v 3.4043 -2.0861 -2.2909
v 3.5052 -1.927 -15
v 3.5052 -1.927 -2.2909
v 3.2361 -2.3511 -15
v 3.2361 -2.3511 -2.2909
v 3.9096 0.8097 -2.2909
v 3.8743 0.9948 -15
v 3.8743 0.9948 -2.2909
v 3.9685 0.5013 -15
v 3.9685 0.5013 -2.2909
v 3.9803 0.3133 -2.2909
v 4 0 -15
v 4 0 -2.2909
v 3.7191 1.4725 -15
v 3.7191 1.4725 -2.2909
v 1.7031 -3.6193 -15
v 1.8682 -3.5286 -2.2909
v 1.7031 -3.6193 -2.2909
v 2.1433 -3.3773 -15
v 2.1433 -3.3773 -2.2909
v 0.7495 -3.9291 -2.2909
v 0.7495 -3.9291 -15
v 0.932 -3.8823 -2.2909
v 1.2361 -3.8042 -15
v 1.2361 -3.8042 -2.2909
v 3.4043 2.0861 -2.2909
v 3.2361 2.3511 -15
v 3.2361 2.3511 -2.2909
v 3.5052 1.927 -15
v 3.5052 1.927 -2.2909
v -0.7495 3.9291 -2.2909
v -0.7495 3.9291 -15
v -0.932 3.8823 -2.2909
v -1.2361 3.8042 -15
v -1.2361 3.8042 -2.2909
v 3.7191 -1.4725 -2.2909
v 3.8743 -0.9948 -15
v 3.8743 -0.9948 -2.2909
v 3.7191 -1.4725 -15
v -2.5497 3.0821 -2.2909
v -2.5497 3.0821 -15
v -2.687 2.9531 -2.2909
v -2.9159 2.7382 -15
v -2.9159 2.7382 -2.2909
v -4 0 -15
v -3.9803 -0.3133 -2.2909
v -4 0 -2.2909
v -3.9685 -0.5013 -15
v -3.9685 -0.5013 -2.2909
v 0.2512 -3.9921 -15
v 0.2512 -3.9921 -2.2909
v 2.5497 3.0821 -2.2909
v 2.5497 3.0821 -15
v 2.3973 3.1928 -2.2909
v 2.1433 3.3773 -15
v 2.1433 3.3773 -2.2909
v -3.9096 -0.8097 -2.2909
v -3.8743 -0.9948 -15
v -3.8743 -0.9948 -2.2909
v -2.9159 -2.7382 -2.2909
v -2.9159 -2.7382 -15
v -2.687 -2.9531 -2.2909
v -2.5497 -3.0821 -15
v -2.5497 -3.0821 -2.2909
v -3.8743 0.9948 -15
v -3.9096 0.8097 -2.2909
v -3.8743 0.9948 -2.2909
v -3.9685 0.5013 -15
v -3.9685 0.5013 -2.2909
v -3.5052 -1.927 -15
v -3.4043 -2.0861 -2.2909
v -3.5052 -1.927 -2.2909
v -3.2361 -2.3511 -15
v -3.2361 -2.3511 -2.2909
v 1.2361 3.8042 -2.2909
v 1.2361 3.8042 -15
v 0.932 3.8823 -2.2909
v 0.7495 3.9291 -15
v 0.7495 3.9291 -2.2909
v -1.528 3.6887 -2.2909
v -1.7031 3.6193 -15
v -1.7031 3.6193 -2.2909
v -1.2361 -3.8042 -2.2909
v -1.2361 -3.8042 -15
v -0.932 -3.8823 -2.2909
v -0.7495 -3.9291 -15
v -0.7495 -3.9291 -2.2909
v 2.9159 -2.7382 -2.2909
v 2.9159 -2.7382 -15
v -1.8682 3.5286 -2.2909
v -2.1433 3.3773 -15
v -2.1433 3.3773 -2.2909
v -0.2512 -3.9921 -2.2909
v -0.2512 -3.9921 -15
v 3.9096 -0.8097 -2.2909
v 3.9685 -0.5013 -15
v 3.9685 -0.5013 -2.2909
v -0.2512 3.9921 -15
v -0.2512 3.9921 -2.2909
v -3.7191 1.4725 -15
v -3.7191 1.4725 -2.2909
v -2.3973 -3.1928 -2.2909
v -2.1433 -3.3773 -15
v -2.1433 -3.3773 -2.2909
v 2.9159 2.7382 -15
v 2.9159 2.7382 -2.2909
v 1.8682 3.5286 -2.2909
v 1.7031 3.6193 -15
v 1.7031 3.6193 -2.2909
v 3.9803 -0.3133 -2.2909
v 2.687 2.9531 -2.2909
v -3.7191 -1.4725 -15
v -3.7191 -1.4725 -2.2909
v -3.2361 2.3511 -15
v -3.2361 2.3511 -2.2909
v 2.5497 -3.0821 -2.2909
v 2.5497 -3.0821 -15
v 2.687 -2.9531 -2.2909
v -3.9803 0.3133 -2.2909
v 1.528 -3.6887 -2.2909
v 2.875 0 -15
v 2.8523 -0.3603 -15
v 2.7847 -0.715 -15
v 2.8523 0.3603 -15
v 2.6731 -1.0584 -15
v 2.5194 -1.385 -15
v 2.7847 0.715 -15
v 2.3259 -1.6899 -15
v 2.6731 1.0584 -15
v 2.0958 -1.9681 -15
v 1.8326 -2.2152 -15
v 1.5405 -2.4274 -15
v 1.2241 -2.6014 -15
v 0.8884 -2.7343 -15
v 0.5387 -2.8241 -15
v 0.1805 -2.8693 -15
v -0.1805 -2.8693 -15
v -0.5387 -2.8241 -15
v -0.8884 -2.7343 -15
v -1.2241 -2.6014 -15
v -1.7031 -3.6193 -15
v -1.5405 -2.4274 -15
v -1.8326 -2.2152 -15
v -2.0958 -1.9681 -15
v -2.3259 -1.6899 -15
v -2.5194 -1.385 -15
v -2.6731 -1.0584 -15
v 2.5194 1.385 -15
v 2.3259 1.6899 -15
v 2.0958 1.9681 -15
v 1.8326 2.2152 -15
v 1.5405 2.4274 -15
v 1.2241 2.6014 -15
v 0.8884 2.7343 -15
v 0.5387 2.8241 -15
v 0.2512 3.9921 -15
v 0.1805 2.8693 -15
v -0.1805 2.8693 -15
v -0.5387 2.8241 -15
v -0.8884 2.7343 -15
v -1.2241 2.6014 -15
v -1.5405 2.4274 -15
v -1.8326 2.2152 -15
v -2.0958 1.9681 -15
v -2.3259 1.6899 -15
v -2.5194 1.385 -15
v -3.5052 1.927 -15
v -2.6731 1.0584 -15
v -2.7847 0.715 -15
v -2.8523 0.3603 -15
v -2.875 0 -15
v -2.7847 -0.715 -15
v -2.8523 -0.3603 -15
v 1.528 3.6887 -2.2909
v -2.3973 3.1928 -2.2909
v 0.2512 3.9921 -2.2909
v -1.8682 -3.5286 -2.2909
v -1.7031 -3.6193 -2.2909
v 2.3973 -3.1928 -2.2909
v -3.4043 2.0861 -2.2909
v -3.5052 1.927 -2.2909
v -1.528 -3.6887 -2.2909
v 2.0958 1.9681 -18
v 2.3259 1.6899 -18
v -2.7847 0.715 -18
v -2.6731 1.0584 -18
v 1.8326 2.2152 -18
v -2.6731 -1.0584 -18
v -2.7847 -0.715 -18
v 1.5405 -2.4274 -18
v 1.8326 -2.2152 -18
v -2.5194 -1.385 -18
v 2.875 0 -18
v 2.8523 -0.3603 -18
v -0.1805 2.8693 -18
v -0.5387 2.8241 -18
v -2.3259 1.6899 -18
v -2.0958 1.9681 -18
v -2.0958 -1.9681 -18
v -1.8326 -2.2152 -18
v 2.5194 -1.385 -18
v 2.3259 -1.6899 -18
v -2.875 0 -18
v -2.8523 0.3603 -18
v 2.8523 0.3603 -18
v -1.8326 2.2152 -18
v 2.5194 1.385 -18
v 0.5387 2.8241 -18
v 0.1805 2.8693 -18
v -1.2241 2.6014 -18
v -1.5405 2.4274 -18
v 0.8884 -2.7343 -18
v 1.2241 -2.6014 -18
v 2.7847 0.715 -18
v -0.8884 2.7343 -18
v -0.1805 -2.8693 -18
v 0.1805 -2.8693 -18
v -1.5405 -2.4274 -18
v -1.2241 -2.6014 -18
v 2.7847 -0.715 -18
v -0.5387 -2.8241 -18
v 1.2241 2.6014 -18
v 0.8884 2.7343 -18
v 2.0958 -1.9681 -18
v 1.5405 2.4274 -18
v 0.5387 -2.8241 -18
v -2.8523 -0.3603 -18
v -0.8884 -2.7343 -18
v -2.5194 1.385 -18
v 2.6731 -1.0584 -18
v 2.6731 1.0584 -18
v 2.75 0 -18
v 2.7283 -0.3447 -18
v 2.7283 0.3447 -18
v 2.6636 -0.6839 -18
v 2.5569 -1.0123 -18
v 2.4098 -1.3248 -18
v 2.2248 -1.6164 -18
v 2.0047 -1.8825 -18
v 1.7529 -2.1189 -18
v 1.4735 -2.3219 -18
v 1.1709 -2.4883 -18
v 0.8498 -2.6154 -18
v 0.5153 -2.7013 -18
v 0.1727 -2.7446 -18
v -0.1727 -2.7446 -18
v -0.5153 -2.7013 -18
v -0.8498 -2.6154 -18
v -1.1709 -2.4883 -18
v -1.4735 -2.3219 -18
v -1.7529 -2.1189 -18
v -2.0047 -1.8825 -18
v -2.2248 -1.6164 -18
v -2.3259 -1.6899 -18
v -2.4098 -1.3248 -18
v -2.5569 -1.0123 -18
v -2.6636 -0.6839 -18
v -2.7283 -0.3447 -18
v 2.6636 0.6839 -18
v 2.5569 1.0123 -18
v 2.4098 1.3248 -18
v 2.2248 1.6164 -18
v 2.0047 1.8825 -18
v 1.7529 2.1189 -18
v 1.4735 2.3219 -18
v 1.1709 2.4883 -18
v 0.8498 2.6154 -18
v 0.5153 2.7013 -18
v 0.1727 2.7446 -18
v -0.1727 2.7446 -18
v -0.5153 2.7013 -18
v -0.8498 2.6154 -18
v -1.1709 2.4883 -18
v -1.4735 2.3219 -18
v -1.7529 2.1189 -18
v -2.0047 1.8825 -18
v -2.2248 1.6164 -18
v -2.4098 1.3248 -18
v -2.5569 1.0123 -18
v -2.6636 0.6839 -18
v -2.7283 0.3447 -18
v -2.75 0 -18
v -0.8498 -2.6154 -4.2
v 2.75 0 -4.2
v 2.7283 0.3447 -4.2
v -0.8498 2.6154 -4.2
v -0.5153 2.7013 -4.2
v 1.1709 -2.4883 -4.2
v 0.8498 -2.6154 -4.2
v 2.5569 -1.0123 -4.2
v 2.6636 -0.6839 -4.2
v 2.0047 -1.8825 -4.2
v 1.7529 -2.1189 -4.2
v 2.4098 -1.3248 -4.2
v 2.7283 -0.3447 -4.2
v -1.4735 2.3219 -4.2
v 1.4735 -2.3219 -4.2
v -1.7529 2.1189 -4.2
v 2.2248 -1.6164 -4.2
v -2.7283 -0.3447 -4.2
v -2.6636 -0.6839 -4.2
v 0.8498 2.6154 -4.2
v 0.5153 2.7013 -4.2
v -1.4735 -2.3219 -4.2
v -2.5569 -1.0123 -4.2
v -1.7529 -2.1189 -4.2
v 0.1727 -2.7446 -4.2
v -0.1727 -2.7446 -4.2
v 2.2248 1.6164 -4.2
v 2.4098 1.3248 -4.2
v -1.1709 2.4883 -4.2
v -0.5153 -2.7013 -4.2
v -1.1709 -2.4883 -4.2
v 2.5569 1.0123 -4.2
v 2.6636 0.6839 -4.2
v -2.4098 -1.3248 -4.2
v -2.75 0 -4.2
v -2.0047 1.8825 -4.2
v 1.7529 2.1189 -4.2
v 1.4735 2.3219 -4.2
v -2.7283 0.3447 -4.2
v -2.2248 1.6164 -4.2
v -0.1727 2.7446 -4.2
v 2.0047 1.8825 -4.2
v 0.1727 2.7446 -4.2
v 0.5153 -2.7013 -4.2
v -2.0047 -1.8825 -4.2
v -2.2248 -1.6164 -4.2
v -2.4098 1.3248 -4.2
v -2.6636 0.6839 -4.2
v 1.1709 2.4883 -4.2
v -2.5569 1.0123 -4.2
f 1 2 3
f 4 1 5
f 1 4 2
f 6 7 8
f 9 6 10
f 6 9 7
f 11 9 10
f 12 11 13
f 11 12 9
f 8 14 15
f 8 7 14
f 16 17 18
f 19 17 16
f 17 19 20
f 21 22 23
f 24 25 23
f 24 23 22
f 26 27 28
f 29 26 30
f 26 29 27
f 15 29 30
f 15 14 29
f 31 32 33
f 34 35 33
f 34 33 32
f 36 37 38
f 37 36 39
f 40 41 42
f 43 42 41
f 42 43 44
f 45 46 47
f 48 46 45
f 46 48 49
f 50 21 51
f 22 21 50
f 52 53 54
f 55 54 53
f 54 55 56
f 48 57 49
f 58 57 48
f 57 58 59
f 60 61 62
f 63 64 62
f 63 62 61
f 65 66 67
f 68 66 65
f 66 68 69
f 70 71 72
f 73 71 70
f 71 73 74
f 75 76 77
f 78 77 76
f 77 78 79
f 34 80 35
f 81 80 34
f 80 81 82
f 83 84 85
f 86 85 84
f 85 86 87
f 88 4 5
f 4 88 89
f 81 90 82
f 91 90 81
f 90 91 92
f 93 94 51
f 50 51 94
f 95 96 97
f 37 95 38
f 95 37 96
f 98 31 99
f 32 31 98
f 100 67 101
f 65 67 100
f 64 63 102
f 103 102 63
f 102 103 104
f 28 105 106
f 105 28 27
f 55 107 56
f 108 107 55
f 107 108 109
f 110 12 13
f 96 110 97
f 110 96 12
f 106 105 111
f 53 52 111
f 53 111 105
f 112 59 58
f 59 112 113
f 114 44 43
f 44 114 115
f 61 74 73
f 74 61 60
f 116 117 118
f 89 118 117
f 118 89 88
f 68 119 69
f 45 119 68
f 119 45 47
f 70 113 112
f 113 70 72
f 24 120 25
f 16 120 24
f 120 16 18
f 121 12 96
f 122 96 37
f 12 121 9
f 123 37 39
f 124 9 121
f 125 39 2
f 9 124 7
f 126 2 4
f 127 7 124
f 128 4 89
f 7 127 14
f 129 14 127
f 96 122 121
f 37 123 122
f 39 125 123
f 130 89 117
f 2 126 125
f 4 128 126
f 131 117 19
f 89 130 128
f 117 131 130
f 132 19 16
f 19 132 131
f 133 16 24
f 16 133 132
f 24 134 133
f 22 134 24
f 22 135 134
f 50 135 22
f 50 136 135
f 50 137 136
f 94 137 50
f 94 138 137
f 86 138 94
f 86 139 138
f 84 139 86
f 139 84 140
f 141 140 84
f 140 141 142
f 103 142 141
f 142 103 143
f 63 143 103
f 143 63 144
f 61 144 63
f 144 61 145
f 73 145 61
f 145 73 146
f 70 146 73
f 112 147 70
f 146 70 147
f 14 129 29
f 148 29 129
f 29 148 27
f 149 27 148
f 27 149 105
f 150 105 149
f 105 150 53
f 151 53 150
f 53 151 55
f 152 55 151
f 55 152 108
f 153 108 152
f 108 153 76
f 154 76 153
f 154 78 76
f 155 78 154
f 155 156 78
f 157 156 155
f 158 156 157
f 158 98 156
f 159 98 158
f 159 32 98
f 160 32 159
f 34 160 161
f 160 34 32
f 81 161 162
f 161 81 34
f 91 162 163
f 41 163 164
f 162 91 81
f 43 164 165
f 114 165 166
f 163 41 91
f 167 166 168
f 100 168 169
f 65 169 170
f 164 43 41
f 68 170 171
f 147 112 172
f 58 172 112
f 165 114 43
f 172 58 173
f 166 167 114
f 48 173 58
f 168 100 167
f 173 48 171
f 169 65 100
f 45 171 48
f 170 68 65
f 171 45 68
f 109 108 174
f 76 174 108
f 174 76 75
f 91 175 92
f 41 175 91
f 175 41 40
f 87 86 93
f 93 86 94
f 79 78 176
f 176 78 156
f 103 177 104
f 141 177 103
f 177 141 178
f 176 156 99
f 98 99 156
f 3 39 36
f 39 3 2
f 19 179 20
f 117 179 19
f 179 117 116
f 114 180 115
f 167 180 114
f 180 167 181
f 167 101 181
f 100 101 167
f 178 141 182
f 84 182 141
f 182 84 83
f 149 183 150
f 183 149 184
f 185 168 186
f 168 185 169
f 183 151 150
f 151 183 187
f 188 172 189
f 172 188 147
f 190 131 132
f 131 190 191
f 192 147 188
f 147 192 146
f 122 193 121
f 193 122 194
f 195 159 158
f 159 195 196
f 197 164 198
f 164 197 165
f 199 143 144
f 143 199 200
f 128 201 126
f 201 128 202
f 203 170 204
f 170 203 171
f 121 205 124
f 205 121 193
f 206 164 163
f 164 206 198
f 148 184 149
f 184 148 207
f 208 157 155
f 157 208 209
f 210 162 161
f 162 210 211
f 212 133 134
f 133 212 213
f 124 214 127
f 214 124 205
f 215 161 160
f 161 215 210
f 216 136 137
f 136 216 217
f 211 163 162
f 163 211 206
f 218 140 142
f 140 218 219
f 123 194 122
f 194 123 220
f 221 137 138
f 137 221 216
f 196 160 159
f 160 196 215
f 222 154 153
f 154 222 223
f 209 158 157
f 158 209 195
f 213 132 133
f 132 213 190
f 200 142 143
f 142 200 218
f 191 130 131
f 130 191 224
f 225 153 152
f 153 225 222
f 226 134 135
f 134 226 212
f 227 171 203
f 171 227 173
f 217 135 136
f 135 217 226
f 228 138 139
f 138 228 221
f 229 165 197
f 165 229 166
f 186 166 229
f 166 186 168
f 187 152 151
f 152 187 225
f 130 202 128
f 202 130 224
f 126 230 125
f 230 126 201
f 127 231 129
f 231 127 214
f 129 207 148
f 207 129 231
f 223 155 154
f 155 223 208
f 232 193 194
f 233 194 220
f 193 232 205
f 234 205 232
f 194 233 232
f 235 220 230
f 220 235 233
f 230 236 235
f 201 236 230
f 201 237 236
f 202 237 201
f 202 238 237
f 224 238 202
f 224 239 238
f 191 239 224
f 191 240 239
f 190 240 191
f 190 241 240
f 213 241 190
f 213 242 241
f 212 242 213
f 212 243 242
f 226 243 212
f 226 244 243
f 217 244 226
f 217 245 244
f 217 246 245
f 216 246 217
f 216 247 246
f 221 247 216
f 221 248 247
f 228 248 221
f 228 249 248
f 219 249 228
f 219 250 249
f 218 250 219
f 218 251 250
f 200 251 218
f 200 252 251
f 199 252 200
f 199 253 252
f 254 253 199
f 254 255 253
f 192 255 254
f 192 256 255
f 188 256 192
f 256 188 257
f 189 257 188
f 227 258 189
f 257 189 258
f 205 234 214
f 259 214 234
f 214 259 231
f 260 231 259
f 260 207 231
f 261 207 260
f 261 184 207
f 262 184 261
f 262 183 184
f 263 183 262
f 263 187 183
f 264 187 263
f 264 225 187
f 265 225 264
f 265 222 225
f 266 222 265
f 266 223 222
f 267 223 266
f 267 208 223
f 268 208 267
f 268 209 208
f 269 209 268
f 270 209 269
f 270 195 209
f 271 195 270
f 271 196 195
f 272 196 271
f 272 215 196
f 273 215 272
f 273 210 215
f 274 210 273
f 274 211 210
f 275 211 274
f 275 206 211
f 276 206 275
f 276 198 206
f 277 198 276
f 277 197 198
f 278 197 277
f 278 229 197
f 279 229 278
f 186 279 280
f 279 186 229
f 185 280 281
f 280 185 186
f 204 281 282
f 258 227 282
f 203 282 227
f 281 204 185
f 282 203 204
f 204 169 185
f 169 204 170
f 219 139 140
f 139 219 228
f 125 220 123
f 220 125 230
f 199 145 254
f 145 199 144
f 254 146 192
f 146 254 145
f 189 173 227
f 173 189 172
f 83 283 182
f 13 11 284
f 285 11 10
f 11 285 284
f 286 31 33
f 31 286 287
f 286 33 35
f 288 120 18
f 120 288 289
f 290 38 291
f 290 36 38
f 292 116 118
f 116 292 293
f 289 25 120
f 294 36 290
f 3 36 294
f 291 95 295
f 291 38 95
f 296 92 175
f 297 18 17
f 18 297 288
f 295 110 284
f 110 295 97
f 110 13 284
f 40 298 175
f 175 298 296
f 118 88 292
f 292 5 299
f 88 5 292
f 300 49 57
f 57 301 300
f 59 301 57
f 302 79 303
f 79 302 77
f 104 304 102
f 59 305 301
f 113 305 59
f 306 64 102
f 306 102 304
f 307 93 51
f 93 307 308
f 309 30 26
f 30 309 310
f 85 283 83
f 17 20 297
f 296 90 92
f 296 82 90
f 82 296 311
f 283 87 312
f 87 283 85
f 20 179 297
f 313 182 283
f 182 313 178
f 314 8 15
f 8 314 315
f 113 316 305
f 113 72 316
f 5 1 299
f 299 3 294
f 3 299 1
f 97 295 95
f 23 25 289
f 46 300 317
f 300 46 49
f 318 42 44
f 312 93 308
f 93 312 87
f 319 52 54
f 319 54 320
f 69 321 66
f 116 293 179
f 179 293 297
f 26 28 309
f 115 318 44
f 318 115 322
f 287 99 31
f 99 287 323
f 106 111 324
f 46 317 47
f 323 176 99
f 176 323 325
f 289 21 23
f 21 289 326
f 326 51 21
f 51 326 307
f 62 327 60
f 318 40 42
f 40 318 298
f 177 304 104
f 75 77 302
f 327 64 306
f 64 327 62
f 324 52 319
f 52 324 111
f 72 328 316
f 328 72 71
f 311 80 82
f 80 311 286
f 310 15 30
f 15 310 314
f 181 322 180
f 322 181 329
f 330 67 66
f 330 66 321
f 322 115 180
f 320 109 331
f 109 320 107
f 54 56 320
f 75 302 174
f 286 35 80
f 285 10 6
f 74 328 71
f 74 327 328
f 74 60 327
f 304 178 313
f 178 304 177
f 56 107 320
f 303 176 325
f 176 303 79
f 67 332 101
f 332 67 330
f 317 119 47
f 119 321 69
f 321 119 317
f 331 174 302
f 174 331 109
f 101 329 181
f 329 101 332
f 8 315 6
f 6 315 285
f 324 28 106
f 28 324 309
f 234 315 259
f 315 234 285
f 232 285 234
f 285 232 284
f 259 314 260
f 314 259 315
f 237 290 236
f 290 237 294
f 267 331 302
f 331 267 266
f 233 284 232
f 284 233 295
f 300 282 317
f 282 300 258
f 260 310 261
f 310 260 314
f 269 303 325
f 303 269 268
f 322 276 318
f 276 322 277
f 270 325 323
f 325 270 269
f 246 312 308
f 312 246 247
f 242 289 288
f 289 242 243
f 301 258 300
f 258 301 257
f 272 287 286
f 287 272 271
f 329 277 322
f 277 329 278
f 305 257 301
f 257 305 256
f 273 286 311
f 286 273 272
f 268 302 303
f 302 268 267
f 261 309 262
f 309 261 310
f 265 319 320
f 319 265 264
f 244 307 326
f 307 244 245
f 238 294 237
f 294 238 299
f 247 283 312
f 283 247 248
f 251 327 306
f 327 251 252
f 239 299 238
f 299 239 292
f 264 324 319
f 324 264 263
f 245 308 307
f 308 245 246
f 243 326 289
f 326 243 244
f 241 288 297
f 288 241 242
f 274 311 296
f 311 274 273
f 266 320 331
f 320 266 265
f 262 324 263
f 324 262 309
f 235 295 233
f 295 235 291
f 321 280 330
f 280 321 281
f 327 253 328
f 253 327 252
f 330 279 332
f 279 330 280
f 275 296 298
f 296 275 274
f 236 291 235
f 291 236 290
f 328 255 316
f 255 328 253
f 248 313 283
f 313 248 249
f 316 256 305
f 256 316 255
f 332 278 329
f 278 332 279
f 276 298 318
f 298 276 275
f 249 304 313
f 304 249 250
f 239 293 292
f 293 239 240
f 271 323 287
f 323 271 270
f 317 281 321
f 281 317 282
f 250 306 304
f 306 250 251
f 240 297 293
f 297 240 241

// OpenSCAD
$fn = 50;

difference() {
	union() {
		translate(v = [0, 0, -15.0]) {
			cylinder(h = 15, r = 4.0);
		}
		#translate(v = [0, 0, -18.0]) {
			cylinder(h = 18, r = 2.875);
		}
	}
	union() {
		translate(v = [0, 0, 0]) {
			rotate(a = [0, 0, 0]) {
				difference() {
					union() {
						translate(v = [0, 0, -18.0]) {
							cylinder(h = 18, r = 2.25);
						}
						translate(v = [0, 0, -4.2]) {
							cylinder(h = 4.2, r1 = 2.75, r2 = 5.5);
						}
						translate(v = [0, 0, -18.0]) {
							cylinder(h = 18, r = 2.75);
						}
						translate(v = [0, 0, -18.0]) {
							cylinder(h = 18, r = 2.25);
						}
					}
					union();
				}
			}
		}
	}
}
